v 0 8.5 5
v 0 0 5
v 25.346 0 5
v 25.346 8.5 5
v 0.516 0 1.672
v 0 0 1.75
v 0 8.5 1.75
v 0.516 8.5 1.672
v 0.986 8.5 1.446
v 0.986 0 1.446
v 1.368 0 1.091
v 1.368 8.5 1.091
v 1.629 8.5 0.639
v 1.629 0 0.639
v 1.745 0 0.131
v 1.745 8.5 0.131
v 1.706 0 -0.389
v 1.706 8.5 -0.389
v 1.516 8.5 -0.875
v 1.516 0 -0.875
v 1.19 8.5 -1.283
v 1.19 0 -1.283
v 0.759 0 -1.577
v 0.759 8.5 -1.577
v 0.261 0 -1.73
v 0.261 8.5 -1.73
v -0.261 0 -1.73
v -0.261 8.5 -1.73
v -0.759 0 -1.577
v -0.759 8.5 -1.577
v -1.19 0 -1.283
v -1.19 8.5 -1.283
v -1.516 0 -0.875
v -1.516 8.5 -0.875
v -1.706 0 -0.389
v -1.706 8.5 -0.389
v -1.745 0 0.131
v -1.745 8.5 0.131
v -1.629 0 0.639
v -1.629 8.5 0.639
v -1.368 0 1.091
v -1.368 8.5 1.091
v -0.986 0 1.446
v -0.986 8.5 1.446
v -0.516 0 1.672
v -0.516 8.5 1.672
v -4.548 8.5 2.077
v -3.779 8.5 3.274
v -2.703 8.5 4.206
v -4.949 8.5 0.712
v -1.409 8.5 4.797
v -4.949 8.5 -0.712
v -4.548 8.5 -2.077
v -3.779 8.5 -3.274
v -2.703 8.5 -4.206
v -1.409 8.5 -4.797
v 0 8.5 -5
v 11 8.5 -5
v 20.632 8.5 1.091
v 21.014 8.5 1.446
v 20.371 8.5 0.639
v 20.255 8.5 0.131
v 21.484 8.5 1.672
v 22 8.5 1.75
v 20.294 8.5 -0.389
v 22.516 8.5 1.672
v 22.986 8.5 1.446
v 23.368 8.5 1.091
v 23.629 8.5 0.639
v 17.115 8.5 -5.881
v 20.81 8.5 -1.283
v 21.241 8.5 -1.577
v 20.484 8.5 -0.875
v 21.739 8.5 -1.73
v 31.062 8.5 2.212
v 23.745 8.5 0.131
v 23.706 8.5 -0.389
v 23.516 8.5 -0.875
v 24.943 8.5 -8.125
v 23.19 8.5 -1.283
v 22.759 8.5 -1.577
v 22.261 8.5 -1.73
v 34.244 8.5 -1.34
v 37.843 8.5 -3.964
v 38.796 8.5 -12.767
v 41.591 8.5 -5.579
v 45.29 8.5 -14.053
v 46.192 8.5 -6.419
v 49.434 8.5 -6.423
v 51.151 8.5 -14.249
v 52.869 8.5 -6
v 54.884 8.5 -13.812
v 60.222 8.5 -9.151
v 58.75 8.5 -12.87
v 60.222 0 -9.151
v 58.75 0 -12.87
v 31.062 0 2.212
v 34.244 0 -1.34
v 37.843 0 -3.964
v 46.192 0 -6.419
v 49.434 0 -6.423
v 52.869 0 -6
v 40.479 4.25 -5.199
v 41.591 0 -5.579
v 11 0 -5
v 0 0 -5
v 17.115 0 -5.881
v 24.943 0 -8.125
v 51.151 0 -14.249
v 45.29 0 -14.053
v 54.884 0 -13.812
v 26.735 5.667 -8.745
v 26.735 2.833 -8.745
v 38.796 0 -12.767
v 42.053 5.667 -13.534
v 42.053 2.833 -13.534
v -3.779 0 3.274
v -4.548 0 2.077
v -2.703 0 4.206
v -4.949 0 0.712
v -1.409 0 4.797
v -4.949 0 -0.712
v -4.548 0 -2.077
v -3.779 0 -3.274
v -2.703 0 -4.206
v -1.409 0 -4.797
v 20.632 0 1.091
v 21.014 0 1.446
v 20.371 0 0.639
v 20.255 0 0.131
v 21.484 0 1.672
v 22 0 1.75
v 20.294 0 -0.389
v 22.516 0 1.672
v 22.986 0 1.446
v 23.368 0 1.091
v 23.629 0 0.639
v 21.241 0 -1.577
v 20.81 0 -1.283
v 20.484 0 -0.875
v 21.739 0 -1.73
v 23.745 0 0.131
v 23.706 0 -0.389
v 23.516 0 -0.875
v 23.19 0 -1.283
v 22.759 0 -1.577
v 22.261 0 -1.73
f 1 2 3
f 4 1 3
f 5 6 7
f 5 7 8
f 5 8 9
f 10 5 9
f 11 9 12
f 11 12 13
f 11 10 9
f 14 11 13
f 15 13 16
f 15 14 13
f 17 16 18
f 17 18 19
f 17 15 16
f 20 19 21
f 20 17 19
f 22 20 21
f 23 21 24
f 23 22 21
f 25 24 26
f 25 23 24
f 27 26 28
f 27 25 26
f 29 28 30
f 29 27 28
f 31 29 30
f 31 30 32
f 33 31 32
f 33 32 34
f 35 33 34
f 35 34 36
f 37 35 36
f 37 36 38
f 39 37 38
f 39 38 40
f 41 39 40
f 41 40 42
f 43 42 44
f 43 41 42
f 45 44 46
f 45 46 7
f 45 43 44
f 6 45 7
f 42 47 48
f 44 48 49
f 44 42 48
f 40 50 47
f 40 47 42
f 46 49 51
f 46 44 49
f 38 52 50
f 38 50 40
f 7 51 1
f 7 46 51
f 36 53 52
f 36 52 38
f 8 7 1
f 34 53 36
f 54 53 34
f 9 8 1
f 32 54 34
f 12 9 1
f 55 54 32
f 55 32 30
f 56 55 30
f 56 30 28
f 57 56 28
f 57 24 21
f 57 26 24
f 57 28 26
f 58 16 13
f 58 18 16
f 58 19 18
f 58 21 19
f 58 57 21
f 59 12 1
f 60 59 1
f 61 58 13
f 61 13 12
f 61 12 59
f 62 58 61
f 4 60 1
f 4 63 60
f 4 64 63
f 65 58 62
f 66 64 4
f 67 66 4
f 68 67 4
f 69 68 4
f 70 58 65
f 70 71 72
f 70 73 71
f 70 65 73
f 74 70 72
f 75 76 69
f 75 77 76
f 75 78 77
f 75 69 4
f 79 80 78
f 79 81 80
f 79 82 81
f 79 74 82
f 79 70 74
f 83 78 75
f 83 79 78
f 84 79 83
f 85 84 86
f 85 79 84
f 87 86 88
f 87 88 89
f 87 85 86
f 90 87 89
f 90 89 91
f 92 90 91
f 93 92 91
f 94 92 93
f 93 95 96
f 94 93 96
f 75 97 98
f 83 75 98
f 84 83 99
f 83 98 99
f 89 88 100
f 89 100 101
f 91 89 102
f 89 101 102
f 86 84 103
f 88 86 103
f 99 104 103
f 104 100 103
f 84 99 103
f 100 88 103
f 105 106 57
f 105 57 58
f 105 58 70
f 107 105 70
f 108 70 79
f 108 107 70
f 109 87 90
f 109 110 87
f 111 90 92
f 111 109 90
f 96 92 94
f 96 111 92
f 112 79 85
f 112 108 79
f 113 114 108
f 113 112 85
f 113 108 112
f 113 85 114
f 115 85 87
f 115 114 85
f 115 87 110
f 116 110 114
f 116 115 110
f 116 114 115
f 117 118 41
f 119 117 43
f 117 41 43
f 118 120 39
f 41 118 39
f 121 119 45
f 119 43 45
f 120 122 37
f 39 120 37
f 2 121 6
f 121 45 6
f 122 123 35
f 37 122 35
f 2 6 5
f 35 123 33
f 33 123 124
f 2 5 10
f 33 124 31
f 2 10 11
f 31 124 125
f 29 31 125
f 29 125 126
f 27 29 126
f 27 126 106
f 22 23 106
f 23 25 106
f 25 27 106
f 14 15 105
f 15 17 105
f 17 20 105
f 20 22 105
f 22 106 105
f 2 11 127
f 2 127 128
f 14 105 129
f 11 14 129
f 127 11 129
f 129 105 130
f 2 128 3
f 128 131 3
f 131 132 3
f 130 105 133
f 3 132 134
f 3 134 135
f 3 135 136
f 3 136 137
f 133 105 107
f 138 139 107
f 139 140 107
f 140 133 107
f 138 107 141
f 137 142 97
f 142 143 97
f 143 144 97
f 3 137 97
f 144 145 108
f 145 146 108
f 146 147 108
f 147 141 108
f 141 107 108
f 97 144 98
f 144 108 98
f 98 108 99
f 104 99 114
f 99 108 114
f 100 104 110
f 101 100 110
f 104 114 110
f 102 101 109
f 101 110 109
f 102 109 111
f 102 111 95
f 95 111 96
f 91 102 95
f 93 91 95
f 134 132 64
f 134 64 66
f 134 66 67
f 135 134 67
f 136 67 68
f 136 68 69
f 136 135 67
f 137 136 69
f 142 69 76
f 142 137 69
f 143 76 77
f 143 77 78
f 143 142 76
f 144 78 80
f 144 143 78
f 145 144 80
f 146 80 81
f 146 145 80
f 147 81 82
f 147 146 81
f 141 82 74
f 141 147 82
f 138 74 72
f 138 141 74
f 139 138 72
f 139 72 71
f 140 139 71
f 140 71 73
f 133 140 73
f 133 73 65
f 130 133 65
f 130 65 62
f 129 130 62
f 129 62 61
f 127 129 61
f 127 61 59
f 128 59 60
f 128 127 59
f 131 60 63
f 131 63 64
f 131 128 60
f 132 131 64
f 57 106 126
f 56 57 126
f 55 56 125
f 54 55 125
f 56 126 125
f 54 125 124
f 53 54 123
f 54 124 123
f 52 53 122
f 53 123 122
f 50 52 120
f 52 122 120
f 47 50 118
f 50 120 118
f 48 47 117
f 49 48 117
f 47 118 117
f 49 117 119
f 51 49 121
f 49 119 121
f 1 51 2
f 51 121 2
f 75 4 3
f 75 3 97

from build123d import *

# Parameters (mm, degrees)
SKETCH1_R           = 5
SKETCH1_R_2         = 1.75
BOSS_EXTRUDE2_DEPTH = 8.5
BOSS_EXTRUDE3_START = -8.5
BOSS_EXTRUDE3_DEPTH = 8.5


with BuildPart() as part:
    # Sketch1 → Boss-Extrude2 (new body)
    # profile 1 of 3: a face of its own
    with BuildSketch(Plane(origin=(0, 0, 0), x_dir=(1, 0, 0), z_dir=(0, 1, 0))):
        Circle(SKETCH1_R)
        with Locations(Location((0, 0, 0), (0, 0, 270))):
            Circle(SKETCH1_R_2, mode=Mode.SUBTRACT)
    # profile 2 of 3: a face of its own
    with BuildSketch(Plane(origin=(0, 0, 0), x_dir=(1, 0, 0), z_dir=(0, 1, 0))):
        with Locations((22, 0)):
            Circle(SKETCH1_R)
        with Locations(Location((22, 0, 0), (0, 0, 270))):
            Circle(SKETCH1_R_2, mode=Mode.SUBTRACT)
    # profile 3 of 3: a face of its own
    with BuildSketch(Plane(origin=(0, 0, 0), x_dir=(1, 0, 0), z_dir=(0, 1, 0))):
        with BuildLine():
            Line((0, 5), (22, 5))
            ThreePointArc((22, 5), (17, 0), (22, -5))
            Line((22, -5), (0, -5))
            ThreePointArc((0, -5), (5, 0), (0, 5))
        make_face()
    extrude(amount=BOSS_EXTRUDE2_DEPTH)

    # Sketch2 → Boss-Extrude3 (add)
    with BuildSketch(Plane(origin=(0, 8.5, 0), x_dir=(1, 0, 0), z_dir=(0, 1, 0)).offset(BOSS_EXTRUDE3_START)):
        with BuildLine():
            Line((22, -5), (25.346400572, -5))
            Line((25.346400572, -5), (31.061757845, -2.212434003))
            add(Edge.make_bspline(
                [(31.061757845, -2.212434003), (38.992757935, 8.50475737), (52.869115173, 6)],
                knots=[0, 0, 0, 1, 1, 1], degree=2))
            Line((52.869115173, 6), (60.222476385, 9.150885415))
            Line((60.222476385, 9.150885415), (58.75, 12.87))
            add(Edge.make_bspline(
                [(11, 5), (27.543585327, 6.057362318), (40.764199153, 18.426668213), (58.75, 12.87)],
                knots=[0, 0, 0, 0, 1, 1, 1, 1], degree=3))
            Line((11, 5), (22, 5))
            ThreePointArc((22, 5), (27, 0), (22, -5))
        make_face()
    extrude(amount=BOSS_EXTRUDE3_DEPTH)


solid = part.part
